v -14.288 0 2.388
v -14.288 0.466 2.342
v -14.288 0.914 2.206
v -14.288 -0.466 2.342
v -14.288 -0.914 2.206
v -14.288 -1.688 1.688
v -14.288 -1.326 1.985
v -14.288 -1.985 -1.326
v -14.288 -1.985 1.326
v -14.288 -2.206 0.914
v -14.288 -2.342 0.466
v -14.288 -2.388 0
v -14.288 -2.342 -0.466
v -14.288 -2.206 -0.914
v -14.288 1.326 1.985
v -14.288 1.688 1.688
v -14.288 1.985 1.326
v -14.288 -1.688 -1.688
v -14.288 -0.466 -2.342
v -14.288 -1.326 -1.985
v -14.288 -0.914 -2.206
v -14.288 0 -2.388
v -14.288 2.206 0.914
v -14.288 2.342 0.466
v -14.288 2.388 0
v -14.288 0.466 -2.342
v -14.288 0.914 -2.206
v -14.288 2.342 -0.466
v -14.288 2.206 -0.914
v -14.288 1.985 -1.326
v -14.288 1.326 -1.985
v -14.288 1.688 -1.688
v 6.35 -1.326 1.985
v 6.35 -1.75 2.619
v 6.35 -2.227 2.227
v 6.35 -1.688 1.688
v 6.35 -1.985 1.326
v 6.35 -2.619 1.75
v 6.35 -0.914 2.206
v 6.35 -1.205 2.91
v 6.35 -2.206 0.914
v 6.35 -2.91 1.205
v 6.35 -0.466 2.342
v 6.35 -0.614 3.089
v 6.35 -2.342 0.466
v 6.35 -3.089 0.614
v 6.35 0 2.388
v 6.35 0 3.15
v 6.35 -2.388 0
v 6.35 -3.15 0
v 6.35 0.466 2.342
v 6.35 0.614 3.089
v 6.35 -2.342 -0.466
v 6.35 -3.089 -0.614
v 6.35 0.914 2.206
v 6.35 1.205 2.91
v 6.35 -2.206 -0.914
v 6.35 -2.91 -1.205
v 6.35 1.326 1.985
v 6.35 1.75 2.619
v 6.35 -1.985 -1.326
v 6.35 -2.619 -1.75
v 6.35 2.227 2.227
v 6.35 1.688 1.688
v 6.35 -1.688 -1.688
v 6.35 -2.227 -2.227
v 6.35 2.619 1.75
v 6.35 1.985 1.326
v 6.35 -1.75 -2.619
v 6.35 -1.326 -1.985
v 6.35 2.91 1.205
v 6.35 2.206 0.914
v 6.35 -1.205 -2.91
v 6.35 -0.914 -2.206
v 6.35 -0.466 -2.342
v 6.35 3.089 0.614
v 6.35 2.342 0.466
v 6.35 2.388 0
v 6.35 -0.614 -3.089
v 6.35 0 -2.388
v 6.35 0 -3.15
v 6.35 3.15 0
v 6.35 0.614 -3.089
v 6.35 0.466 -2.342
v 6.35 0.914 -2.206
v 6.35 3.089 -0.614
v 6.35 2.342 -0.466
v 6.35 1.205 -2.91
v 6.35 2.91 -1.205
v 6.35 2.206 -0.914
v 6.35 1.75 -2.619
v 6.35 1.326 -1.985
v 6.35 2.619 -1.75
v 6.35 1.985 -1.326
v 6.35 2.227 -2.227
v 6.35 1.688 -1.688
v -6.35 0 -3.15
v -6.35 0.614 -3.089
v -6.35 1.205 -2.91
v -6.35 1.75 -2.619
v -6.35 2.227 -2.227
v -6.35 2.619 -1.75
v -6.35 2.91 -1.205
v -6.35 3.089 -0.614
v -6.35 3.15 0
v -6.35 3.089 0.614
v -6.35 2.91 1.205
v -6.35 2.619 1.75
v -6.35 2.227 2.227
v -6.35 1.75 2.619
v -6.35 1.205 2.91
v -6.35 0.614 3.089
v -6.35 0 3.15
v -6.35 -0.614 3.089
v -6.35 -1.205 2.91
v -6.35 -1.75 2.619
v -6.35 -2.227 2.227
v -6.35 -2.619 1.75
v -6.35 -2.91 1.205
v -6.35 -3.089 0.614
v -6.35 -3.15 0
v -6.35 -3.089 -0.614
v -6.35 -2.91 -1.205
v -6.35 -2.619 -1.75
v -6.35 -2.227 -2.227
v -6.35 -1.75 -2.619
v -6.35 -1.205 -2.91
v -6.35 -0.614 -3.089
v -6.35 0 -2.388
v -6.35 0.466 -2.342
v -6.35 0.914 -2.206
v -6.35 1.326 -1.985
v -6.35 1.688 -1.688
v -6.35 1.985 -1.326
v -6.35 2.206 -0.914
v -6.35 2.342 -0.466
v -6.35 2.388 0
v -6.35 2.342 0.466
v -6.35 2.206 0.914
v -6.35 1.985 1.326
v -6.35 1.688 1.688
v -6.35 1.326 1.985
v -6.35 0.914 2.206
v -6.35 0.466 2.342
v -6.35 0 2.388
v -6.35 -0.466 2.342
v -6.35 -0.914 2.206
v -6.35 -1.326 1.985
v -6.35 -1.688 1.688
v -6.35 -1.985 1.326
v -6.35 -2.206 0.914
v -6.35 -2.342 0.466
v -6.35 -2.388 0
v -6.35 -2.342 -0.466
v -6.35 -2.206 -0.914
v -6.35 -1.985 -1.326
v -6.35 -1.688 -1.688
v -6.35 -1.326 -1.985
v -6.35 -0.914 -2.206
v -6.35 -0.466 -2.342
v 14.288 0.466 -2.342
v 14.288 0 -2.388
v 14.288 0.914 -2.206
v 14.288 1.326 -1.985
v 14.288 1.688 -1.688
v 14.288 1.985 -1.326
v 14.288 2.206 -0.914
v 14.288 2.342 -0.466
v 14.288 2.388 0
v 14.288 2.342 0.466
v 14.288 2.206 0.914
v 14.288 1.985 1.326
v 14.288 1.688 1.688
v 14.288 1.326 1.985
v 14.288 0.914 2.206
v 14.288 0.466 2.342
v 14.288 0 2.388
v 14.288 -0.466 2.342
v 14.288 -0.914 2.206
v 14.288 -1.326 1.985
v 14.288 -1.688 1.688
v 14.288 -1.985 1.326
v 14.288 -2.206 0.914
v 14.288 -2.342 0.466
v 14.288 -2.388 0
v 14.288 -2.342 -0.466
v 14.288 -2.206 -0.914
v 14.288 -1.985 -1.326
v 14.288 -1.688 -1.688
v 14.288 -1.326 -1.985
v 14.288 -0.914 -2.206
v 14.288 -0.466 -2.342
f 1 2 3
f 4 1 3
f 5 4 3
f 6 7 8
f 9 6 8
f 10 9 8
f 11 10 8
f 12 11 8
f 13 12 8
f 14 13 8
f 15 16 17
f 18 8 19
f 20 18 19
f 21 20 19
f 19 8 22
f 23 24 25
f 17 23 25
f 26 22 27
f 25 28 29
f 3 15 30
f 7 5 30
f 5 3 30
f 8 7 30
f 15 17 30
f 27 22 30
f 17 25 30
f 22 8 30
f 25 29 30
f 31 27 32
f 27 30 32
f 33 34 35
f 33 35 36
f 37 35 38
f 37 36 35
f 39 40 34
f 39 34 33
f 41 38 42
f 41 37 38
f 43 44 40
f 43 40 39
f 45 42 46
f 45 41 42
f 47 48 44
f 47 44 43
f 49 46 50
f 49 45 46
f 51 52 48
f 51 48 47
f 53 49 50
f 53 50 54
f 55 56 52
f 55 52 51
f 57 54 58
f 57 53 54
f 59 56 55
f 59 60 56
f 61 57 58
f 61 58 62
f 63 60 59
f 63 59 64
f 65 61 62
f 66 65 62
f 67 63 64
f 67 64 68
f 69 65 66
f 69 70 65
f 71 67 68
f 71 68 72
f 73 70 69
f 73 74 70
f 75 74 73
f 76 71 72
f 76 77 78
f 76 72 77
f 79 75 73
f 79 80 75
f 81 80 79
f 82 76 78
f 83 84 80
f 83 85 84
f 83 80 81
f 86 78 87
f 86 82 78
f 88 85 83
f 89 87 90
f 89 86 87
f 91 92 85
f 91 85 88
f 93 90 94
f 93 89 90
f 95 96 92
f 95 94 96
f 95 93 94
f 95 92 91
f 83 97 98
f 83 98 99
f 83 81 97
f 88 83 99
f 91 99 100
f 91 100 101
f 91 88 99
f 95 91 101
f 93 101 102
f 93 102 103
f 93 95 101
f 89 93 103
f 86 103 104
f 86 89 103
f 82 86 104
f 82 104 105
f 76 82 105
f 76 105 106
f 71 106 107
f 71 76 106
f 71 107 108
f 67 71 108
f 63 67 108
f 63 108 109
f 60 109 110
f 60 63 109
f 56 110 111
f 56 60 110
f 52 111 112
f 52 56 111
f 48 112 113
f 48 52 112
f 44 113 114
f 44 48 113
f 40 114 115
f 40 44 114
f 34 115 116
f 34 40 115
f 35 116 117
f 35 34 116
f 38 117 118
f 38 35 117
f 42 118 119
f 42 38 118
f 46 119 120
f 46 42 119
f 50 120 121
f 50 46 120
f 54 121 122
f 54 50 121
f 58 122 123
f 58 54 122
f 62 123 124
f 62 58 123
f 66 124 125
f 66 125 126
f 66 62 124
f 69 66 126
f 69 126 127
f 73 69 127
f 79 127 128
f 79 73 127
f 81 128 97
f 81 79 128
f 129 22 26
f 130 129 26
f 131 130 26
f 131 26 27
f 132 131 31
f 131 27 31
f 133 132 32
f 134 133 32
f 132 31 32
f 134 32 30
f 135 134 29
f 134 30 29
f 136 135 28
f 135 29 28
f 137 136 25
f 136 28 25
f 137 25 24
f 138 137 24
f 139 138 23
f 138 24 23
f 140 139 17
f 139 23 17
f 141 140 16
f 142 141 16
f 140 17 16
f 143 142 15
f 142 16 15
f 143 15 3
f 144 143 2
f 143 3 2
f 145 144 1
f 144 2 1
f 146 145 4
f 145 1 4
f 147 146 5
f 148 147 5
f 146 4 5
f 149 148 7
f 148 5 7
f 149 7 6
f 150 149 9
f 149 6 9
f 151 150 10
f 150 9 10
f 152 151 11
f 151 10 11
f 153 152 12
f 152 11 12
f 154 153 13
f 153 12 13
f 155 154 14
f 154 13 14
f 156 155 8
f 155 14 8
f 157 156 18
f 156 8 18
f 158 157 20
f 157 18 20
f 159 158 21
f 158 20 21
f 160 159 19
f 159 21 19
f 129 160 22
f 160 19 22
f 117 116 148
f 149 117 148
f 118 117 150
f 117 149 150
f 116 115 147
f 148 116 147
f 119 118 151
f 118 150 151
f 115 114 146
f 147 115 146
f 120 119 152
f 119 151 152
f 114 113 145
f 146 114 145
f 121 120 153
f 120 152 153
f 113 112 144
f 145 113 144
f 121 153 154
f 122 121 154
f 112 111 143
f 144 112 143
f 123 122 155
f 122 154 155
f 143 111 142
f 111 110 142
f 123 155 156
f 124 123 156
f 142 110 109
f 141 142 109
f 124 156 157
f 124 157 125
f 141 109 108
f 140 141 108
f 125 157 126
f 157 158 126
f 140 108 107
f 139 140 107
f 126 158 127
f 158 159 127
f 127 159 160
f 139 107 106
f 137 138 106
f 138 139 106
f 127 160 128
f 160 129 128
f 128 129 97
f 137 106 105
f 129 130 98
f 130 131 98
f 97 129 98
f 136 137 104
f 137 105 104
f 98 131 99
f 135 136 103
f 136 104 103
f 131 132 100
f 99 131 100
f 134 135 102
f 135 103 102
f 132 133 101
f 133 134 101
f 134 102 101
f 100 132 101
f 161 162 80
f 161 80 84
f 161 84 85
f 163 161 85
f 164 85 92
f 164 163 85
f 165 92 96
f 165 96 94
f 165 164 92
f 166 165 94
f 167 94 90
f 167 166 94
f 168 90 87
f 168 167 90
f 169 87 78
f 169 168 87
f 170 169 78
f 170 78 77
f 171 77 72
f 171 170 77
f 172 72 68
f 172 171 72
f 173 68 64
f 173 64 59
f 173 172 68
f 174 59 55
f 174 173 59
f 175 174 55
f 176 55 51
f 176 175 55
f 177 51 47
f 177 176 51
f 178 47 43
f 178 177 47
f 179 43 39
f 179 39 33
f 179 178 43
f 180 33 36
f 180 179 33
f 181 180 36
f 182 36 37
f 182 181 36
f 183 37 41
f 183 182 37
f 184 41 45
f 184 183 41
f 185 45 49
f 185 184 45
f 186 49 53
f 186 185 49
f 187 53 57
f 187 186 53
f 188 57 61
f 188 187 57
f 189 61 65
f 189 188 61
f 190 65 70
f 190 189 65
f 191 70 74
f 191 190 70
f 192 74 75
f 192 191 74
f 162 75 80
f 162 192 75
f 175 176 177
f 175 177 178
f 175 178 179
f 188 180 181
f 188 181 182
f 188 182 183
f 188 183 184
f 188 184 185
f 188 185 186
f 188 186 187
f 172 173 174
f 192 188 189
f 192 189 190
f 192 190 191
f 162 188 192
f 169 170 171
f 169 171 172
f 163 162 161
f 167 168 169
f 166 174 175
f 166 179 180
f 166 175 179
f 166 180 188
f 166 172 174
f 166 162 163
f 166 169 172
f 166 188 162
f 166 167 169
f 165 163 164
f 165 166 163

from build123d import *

# Parameters (mm, degrees)
SKETCH1_R           = 3.1496
BOSS_EXTRUDE1_DEPTH = 14.2875
SKETCH3_R           = 3.1496
SKETCH3_R_2         = 2.3876
CUT_EXTRUDE2_DEPTH  = 7.9375


with BuildPart() as part:
    # Sketch1 → Boss-Extrude1 (new, symmetric)
    with BuildSketch(Plane(origin=(0, 0, 0), x_dir=(0, 0, -1), z_dir=(1, 0, 0))):
        Circle(SKETCH1_R)
    extrude(amount=BOSS_EXTRUDE1_DEPTH, both=True)

    # Sketch3 → Cut-Extrude2 (cut)
    with BuildSketch(Plane(origin=(14.2875, 0, 0), x_dir=(0, 0, -1), z_dir=(1, 0, 0))):
        Circle(SKETCH3_R)
        Circle(SKETCH3_R_2, mode=Mode.SUBTRACT)
    cut_extrude2 = extrude(amount=-CUT_EXTRUDE2_DEPTH, mode=Mode.SUBTRACT)

    # Mirror1: Cut-Extrude2 across plane
    add(cut_extrude2.mirror(Plane(origin=(0, 0, 0), x_dir=(0, 0, 1), z_dir=(1, 0, 0))), mode=Mode.SUBTRACT)


solid = part.part
